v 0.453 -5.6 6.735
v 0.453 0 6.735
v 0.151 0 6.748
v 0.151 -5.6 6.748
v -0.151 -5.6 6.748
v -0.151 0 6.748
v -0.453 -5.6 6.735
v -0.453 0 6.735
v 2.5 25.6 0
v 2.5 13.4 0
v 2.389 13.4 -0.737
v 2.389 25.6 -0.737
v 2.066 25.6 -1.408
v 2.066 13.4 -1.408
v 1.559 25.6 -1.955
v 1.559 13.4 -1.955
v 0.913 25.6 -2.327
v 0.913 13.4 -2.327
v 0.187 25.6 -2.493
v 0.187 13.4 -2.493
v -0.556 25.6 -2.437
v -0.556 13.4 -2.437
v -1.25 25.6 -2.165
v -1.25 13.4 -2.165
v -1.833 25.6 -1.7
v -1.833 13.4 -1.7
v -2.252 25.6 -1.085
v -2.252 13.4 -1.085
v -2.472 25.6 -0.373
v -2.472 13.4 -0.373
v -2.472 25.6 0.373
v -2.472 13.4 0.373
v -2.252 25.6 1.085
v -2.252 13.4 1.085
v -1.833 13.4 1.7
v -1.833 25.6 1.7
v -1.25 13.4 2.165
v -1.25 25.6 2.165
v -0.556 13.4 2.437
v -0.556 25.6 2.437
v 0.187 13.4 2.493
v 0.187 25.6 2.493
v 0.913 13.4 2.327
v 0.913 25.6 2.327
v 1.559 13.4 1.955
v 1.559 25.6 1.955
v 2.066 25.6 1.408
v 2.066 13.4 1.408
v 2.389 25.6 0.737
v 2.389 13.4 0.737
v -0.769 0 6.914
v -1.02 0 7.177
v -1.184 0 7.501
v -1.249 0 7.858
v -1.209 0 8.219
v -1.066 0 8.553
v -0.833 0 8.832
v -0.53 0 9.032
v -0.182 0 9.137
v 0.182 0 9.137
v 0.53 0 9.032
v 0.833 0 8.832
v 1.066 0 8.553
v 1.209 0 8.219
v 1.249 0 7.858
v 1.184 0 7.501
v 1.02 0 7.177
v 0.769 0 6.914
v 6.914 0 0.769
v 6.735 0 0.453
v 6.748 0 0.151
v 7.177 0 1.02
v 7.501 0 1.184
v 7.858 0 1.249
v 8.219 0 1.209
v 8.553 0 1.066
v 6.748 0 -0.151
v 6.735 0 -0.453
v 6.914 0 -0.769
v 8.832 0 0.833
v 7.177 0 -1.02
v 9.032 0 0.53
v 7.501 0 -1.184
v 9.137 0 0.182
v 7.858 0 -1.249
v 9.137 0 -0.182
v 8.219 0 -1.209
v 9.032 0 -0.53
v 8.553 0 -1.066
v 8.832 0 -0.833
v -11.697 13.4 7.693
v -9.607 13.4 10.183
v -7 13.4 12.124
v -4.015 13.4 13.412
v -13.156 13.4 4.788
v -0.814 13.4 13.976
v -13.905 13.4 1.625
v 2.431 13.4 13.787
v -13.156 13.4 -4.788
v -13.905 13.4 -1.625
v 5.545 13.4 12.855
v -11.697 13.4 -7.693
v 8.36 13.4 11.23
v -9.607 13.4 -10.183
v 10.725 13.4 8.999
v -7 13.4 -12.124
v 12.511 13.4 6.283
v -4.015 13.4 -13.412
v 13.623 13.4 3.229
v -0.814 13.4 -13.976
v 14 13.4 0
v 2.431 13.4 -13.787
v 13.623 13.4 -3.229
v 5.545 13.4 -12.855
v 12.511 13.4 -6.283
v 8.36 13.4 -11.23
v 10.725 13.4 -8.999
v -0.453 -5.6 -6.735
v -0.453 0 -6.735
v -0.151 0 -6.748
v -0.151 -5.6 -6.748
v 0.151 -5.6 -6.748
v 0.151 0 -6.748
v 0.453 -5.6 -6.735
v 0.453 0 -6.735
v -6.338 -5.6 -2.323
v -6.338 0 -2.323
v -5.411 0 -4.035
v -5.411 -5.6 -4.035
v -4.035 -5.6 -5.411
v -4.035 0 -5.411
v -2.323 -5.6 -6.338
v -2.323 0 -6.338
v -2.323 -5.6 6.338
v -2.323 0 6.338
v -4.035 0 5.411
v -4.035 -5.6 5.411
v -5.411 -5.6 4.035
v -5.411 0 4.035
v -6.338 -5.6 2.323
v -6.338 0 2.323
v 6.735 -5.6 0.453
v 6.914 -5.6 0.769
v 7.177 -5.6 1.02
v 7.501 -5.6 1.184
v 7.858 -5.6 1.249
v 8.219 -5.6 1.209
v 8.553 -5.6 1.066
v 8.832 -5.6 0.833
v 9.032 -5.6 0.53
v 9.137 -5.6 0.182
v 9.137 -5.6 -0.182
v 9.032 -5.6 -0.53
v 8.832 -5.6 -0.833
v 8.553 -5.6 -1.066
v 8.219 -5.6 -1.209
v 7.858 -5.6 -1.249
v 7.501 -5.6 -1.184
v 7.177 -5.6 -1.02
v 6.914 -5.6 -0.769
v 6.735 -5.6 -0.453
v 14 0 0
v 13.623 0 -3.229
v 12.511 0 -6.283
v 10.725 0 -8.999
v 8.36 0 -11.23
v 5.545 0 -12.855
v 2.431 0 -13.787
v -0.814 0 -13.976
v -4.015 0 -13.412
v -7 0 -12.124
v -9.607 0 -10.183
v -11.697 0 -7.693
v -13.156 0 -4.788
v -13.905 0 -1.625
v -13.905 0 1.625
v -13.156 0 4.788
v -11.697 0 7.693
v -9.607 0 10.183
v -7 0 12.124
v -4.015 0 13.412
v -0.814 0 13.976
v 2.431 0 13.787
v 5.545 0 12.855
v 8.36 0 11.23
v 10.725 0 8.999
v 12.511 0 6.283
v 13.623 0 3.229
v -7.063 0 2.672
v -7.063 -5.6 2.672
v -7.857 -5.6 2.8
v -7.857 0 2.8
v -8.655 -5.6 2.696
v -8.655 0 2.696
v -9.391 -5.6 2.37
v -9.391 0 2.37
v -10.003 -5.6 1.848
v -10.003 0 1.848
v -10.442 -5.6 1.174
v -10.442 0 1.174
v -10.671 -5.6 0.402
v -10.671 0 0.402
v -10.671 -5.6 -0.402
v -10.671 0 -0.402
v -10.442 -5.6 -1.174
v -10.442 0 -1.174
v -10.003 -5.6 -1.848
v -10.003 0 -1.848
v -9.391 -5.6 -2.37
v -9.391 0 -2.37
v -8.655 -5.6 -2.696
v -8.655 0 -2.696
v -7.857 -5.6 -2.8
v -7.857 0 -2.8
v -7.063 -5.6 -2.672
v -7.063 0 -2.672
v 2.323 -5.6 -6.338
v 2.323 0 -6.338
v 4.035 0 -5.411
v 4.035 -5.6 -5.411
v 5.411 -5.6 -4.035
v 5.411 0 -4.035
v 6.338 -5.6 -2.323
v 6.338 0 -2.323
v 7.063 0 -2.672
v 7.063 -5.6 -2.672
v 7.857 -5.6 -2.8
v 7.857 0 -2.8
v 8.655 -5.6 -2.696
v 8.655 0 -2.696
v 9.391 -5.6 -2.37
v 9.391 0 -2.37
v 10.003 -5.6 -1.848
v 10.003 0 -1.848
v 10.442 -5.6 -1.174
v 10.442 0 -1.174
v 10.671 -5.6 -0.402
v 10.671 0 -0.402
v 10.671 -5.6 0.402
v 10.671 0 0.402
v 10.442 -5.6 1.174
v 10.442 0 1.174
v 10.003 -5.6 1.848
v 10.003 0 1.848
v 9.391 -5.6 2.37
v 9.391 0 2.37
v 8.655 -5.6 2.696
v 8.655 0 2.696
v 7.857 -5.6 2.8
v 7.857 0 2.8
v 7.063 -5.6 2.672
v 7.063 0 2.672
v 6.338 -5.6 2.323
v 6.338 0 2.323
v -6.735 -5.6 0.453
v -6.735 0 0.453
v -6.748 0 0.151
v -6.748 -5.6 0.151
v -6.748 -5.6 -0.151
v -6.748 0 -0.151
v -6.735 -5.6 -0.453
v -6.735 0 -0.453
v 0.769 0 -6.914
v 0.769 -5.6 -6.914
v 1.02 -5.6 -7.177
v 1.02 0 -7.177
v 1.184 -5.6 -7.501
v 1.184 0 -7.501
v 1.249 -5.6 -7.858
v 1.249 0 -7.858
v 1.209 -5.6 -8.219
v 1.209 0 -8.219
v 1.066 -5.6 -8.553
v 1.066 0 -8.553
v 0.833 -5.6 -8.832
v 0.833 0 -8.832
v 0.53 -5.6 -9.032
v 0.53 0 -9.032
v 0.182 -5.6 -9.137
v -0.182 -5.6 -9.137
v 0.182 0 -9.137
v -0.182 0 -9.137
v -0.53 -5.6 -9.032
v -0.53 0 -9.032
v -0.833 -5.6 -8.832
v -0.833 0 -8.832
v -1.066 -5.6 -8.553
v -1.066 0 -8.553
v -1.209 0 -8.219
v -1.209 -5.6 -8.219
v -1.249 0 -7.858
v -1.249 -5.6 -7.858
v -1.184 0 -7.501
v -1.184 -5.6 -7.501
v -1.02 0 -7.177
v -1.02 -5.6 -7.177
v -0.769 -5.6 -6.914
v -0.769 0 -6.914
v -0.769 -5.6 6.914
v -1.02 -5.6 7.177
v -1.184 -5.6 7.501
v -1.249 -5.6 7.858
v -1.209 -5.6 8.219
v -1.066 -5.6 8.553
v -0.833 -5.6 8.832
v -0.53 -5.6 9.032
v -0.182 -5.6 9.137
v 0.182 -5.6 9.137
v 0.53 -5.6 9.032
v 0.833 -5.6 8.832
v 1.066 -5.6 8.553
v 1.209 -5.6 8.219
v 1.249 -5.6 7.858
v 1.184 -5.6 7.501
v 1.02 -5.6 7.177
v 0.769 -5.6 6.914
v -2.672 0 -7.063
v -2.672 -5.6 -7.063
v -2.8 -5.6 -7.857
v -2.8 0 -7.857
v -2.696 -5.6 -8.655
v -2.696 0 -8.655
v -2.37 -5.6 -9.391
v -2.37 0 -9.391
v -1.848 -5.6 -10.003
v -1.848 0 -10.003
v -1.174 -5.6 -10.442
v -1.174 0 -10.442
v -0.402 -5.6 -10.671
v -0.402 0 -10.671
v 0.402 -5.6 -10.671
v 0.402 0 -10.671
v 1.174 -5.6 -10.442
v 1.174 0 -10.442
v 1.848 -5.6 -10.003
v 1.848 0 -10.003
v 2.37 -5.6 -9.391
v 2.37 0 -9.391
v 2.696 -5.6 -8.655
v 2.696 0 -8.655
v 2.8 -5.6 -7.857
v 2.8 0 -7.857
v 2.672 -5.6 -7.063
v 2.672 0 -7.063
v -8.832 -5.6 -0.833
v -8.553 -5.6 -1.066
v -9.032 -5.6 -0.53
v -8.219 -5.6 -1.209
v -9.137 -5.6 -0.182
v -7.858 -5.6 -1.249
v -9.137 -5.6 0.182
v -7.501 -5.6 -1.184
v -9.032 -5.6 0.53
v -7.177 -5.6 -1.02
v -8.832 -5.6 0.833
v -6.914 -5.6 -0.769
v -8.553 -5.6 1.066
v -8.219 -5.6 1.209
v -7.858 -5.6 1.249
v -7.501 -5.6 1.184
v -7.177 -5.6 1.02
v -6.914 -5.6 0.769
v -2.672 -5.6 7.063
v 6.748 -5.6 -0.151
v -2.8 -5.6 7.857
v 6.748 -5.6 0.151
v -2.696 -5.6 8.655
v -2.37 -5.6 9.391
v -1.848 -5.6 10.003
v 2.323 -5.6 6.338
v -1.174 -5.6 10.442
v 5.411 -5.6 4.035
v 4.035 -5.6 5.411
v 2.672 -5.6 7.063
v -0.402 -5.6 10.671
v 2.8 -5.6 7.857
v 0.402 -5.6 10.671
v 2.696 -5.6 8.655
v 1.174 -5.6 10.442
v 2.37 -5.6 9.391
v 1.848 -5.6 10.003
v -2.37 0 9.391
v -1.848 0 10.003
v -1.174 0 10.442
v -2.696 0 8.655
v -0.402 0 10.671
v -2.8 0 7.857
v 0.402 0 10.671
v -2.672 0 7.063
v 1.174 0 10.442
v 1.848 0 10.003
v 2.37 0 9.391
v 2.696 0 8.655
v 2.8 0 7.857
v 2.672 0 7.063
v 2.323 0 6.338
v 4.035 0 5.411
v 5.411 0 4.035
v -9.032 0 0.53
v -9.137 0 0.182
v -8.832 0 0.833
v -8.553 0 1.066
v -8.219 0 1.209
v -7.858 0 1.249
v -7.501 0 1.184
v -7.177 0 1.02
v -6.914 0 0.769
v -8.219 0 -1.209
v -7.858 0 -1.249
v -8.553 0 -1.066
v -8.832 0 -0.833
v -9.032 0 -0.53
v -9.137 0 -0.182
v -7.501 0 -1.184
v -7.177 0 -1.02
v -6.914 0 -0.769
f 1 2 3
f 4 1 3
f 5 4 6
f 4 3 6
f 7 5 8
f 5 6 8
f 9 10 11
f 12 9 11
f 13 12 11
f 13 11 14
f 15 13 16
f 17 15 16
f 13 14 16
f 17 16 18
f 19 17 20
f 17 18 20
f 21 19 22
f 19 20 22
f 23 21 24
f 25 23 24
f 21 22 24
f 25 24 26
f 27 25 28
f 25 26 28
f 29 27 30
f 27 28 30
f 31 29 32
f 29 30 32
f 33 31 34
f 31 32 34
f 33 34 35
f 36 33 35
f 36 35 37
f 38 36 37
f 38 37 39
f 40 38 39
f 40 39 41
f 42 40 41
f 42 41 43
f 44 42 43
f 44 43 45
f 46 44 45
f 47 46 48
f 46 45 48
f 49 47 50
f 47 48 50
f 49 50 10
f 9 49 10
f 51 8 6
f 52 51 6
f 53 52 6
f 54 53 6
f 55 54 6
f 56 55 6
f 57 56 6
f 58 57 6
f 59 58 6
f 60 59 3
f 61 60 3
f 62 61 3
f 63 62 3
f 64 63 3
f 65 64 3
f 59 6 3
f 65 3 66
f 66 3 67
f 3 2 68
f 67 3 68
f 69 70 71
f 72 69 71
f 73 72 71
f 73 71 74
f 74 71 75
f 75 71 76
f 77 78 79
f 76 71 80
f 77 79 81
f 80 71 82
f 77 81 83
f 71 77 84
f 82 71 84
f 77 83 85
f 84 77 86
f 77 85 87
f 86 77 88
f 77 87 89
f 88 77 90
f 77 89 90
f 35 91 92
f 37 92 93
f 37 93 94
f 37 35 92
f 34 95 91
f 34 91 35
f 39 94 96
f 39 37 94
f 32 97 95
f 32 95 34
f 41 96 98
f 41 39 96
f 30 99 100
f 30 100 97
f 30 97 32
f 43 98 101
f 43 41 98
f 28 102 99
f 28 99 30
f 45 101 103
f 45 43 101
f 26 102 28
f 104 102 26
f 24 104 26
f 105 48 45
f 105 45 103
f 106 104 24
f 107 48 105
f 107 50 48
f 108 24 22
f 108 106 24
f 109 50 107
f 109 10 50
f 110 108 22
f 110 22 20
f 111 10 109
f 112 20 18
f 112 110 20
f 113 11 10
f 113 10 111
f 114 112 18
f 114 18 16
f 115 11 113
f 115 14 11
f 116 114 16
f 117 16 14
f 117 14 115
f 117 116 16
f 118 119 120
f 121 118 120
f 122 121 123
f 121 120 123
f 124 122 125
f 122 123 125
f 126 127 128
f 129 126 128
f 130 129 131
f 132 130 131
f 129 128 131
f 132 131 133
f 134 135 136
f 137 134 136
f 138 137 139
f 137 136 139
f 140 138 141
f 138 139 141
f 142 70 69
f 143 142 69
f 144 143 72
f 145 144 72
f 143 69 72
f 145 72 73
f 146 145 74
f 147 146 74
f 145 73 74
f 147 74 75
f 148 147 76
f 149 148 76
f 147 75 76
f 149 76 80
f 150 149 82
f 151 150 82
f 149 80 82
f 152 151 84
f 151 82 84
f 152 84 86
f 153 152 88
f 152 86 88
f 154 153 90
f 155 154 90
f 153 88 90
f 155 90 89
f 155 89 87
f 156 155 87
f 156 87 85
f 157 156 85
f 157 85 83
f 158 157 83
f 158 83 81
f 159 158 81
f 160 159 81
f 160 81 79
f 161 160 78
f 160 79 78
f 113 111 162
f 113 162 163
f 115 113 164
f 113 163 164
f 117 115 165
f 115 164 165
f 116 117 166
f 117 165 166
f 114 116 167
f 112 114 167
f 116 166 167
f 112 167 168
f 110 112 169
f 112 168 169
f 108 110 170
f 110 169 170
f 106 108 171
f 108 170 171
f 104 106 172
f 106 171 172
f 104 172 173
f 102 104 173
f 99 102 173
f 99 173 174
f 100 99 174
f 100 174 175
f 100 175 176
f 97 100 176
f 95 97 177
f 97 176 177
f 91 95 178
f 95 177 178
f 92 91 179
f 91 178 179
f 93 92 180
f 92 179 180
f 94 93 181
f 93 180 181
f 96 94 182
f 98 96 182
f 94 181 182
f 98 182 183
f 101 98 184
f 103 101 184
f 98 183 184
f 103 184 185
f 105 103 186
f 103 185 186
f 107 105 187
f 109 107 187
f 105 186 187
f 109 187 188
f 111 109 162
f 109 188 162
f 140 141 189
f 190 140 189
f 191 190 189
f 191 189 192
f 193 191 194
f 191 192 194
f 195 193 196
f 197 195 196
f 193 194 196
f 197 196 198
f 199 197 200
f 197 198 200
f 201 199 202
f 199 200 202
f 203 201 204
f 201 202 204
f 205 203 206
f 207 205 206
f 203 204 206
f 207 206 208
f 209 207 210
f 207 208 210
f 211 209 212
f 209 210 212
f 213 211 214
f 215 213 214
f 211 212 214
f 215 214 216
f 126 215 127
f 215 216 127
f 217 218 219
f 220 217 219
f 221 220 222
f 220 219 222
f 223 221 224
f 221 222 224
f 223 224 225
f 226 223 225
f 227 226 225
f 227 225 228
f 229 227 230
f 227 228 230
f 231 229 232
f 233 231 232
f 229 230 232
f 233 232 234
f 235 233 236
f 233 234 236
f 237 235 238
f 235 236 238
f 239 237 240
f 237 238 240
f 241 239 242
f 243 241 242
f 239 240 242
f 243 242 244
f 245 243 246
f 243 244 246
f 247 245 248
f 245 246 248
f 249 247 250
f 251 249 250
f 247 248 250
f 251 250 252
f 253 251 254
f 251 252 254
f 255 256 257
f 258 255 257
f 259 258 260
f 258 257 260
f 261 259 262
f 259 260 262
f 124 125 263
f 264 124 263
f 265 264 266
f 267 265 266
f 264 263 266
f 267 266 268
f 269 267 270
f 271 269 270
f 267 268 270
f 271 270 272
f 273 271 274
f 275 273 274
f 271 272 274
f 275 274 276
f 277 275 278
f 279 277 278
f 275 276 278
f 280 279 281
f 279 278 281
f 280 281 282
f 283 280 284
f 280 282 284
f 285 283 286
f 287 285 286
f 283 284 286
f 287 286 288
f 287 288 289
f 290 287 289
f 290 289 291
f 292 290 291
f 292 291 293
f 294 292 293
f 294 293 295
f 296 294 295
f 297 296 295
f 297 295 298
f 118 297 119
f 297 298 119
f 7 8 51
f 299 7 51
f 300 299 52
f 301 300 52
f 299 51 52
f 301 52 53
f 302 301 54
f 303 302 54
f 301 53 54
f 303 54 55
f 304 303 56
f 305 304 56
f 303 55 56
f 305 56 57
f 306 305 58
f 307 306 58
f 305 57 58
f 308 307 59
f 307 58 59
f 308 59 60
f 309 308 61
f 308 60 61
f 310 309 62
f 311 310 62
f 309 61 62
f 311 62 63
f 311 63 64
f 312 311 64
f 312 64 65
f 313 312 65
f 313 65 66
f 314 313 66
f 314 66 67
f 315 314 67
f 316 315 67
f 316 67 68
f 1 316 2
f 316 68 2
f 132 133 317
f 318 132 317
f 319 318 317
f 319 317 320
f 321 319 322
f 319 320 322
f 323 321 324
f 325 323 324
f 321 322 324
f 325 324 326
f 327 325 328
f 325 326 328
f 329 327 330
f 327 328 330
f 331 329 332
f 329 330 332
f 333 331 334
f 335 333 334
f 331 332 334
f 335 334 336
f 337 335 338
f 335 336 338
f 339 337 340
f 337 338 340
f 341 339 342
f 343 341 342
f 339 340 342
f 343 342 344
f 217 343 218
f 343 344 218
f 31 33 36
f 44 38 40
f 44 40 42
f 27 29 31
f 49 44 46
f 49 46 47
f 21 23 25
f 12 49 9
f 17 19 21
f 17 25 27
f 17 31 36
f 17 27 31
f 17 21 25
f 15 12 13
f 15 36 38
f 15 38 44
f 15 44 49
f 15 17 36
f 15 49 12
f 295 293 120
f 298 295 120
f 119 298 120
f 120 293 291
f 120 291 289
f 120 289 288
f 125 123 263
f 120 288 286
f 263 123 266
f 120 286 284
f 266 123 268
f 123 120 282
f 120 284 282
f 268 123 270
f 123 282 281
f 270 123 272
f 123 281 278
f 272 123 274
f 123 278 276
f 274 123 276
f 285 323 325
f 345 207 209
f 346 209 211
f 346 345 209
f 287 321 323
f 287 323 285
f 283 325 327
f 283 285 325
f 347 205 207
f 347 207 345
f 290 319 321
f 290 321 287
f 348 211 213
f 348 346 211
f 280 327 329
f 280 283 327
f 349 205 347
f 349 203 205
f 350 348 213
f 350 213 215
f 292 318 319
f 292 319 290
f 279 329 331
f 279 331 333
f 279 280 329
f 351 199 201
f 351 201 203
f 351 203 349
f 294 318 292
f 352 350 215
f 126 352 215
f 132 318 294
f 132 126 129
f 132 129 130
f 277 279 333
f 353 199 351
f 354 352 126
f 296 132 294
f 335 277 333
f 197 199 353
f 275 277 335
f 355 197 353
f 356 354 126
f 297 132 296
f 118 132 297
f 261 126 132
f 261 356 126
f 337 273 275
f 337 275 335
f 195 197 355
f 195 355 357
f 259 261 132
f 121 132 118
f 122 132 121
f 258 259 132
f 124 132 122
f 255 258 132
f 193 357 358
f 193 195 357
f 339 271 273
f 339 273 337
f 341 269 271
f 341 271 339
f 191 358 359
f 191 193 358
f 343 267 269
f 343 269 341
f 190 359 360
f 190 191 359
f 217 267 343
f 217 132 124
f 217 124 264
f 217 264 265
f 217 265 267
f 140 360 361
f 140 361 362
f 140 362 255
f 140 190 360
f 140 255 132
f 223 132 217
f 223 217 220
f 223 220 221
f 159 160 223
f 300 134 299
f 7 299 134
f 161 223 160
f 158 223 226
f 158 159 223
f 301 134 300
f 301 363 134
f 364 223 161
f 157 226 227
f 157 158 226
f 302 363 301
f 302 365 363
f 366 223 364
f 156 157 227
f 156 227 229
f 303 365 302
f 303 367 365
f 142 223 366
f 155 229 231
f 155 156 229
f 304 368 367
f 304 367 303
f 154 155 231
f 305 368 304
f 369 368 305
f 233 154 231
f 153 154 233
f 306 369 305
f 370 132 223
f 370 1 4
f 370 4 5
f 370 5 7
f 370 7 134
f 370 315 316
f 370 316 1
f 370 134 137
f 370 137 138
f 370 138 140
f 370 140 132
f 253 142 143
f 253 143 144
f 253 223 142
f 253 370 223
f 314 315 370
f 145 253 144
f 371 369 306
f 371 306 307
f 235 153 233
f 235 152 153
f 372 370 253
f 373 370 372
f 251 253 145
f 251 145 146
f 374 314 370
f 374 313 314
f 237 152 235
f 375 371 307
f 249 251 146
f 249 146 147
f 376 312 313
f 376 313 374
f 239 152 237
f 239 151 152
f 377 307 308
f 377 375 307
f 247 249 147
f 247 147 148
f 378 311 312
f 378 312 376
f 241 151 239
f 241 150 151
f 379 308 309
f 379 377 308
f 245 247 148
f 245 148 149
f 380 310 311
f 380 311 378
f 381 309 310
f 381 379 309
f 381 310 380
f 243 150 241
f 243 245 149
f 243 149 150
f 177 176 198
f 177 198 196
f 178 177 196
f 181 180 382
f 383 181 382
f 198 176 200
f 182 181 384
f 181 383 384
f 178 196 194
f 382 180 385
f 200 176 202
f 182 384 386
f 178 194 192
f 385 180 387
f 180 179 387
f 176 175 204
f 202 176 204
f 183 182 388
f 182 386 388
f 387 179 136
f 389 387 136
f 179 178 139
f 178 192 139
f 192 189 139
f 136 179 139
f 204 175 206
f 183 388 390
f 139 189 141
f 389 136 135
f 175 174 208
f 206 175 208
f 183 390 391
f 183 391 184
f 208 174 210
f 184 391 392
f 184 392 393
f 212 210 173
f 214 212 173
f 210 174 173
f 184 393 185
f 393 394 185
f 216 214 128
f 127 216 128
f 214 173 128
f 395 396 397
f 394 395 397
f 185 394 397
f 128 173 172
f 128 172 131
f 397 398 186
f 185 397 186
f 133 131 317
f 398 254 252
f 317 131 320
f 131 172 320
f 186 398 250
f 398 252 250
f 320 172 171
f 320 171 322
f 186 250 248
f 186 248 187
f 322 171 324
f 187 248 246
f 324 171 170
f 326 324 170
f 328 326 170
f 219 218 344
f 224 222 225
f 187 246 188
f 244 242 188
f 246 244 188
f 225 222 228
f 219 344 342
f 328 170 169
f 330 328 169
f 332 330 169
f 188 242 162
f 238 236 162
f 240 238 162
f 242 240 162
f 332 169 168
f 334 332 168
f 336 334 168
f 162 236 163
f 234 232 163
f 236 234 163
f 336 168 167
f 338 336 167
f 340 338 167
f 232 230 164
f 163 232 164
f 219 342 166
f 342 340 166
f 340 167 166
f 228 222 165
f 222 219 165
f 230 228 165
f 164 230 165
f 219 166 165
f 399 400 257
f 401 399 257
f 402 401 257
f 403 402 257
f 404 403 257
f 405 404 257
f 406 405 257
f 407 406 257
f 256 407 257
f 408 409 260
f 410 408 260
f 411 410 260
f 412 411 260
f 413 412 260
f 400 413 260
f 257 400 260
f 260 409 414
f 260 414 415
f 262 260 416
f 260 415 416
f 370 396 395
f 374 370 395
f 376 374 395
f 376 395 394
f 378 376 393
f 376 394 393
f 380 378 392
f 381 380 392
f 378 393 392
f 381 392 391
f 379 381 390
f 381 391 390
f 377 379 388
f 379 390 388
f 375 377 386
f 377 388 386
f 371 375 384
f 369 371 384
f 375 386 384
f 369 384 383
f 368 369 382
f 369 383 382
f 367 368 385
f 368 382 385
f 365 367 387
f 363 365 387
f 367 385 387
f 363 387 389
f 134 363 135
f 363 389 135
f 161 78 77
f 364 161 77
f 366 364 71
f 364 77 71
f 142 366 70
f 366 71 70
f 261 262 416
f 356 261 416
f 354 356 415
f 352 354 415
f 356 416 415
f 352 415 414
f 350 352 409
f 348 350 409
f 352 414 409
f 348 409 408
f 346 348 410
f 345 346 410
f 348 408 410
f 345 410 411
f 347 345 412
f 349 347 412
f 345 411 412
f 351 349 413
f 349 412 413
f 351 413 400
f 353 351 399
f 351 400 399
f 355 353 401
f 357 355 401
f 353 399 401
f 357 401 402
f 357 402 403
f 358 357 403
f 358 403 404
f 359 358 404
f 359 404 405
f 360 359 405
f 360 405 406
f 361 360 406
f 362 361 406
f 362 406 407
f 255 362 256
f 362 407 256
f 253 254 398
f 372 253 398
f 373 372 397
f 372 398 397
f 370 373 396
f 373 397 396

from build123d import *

# Parameters (mm, degrees)
SKETCH1_R           = 14
BOSS_EXTRUDE1_DEPTH = 13.4
SKETCH2_R           = 2.5
BOSS_EXTRUDE2_DEPTH = 12.2
SKETCH3_R           = 6.75
BOSS_EXTRUDE3_DEPTH = 5.6


with BuildPart() as part:
    # Sketch1 → Boss-Extrude1 (new body)
    with BuildSketch(Plane(origin=(0, 0, 0), x_dir=(1, 0, 0), z_dir=(0, 1, 0))):
        Circle(SKETCH1_R)
    extrude(amount=BOSS_EXTRUDE1_DEPTH)

    # Sketch2 → Boss-Extrude2 (add)
    with BuildSketch(Plane(origin=(0, 13.4, 0), x_dir=(1, 0, 0), z_dir=(0, 1, 0))):
        Circle(SKETCH2_R)
    extrude(amount=BOSS_EXTRUDE2_DEPTH)

    # Sketch3 → Boss-Extrude3 (add)
    with BuildSketch(Plane.XZ):
        Circle(SKETCH3_R)
        with BuildLine():
            ThreePointArc((-6.734810127, 0.452584311), (-6.602756441, 1.402179513), (-6.3375, 2.323487411))
            ThreePointArc((-6.3375, 2.323487411), (-10.7, 0), (-6.3375, -2.323487411))
            ThreePointArc((-6.3375, -2.323487411), (-6.602756441, -1.402179513), (-6.734810127, -0.452584311))
            ThreePointArc((-6.734810127, -0.452584311), (-9.15, 0), (-6.734810127, 0.452584311))
        make_face()
        with BuildLine():
            ThreePointArc((0.452584311, 6.734810127), (1.402179513, 6.602756441), (2.323487411, 6.3375))
            ThreePointArc((2.323487411, 6.3375), (0, 10.7), (-2.323487411, 6.3375))
            ThreePointArc((-2.323487411, 6.3375), (-1.402179513, 6.602756441), (-0.452584311, 6.734810127))
            ThreePointArc((-0.452584311, 6.734810127), (0, 9.15), (0.452584311, 6.734810127))
        make_face()
        with BuildLine():
            ThreePointArc((-2.323487411, -6.3375), (0, -10.7), (2.323487411, -6.3375))
            ThreePointArc((2.323487411, -6.3375), (1.402179513, -6.602756441), (0.452584311, -6.734810127))
            ThreePointArc((0.452584311, -6.734810127), (0, -9.15), (-0.452584311, -6.734810127))
            ThreePointArc((-0.452584311, -6.734810127), (-1.402179513, -6.602756441), (-2.323487411, -6.3375))
        make_face()
        with BuildLine():
            ThreePointArc((6.3375, 2.323487411), (6.602756441, 1.402179513), (6.734810127, 0.452584311))
            ThreePointArc((6.734810127, 0.452584311), (9.15, 0), (6.734810127, -0.452584311))
            ThreePointArc((6.734810127, -0.452584311), (6.602756441, -1.402179513), (6.3375, -2.323487411))
            ThreePointArc((6.3375, -2.323487411), (10.7, 0), (6.3375, 2.323487411))
        make_face()
    extrude(amount=BOSS_EXTRUDE3_DEPTH)


solid = part.part
